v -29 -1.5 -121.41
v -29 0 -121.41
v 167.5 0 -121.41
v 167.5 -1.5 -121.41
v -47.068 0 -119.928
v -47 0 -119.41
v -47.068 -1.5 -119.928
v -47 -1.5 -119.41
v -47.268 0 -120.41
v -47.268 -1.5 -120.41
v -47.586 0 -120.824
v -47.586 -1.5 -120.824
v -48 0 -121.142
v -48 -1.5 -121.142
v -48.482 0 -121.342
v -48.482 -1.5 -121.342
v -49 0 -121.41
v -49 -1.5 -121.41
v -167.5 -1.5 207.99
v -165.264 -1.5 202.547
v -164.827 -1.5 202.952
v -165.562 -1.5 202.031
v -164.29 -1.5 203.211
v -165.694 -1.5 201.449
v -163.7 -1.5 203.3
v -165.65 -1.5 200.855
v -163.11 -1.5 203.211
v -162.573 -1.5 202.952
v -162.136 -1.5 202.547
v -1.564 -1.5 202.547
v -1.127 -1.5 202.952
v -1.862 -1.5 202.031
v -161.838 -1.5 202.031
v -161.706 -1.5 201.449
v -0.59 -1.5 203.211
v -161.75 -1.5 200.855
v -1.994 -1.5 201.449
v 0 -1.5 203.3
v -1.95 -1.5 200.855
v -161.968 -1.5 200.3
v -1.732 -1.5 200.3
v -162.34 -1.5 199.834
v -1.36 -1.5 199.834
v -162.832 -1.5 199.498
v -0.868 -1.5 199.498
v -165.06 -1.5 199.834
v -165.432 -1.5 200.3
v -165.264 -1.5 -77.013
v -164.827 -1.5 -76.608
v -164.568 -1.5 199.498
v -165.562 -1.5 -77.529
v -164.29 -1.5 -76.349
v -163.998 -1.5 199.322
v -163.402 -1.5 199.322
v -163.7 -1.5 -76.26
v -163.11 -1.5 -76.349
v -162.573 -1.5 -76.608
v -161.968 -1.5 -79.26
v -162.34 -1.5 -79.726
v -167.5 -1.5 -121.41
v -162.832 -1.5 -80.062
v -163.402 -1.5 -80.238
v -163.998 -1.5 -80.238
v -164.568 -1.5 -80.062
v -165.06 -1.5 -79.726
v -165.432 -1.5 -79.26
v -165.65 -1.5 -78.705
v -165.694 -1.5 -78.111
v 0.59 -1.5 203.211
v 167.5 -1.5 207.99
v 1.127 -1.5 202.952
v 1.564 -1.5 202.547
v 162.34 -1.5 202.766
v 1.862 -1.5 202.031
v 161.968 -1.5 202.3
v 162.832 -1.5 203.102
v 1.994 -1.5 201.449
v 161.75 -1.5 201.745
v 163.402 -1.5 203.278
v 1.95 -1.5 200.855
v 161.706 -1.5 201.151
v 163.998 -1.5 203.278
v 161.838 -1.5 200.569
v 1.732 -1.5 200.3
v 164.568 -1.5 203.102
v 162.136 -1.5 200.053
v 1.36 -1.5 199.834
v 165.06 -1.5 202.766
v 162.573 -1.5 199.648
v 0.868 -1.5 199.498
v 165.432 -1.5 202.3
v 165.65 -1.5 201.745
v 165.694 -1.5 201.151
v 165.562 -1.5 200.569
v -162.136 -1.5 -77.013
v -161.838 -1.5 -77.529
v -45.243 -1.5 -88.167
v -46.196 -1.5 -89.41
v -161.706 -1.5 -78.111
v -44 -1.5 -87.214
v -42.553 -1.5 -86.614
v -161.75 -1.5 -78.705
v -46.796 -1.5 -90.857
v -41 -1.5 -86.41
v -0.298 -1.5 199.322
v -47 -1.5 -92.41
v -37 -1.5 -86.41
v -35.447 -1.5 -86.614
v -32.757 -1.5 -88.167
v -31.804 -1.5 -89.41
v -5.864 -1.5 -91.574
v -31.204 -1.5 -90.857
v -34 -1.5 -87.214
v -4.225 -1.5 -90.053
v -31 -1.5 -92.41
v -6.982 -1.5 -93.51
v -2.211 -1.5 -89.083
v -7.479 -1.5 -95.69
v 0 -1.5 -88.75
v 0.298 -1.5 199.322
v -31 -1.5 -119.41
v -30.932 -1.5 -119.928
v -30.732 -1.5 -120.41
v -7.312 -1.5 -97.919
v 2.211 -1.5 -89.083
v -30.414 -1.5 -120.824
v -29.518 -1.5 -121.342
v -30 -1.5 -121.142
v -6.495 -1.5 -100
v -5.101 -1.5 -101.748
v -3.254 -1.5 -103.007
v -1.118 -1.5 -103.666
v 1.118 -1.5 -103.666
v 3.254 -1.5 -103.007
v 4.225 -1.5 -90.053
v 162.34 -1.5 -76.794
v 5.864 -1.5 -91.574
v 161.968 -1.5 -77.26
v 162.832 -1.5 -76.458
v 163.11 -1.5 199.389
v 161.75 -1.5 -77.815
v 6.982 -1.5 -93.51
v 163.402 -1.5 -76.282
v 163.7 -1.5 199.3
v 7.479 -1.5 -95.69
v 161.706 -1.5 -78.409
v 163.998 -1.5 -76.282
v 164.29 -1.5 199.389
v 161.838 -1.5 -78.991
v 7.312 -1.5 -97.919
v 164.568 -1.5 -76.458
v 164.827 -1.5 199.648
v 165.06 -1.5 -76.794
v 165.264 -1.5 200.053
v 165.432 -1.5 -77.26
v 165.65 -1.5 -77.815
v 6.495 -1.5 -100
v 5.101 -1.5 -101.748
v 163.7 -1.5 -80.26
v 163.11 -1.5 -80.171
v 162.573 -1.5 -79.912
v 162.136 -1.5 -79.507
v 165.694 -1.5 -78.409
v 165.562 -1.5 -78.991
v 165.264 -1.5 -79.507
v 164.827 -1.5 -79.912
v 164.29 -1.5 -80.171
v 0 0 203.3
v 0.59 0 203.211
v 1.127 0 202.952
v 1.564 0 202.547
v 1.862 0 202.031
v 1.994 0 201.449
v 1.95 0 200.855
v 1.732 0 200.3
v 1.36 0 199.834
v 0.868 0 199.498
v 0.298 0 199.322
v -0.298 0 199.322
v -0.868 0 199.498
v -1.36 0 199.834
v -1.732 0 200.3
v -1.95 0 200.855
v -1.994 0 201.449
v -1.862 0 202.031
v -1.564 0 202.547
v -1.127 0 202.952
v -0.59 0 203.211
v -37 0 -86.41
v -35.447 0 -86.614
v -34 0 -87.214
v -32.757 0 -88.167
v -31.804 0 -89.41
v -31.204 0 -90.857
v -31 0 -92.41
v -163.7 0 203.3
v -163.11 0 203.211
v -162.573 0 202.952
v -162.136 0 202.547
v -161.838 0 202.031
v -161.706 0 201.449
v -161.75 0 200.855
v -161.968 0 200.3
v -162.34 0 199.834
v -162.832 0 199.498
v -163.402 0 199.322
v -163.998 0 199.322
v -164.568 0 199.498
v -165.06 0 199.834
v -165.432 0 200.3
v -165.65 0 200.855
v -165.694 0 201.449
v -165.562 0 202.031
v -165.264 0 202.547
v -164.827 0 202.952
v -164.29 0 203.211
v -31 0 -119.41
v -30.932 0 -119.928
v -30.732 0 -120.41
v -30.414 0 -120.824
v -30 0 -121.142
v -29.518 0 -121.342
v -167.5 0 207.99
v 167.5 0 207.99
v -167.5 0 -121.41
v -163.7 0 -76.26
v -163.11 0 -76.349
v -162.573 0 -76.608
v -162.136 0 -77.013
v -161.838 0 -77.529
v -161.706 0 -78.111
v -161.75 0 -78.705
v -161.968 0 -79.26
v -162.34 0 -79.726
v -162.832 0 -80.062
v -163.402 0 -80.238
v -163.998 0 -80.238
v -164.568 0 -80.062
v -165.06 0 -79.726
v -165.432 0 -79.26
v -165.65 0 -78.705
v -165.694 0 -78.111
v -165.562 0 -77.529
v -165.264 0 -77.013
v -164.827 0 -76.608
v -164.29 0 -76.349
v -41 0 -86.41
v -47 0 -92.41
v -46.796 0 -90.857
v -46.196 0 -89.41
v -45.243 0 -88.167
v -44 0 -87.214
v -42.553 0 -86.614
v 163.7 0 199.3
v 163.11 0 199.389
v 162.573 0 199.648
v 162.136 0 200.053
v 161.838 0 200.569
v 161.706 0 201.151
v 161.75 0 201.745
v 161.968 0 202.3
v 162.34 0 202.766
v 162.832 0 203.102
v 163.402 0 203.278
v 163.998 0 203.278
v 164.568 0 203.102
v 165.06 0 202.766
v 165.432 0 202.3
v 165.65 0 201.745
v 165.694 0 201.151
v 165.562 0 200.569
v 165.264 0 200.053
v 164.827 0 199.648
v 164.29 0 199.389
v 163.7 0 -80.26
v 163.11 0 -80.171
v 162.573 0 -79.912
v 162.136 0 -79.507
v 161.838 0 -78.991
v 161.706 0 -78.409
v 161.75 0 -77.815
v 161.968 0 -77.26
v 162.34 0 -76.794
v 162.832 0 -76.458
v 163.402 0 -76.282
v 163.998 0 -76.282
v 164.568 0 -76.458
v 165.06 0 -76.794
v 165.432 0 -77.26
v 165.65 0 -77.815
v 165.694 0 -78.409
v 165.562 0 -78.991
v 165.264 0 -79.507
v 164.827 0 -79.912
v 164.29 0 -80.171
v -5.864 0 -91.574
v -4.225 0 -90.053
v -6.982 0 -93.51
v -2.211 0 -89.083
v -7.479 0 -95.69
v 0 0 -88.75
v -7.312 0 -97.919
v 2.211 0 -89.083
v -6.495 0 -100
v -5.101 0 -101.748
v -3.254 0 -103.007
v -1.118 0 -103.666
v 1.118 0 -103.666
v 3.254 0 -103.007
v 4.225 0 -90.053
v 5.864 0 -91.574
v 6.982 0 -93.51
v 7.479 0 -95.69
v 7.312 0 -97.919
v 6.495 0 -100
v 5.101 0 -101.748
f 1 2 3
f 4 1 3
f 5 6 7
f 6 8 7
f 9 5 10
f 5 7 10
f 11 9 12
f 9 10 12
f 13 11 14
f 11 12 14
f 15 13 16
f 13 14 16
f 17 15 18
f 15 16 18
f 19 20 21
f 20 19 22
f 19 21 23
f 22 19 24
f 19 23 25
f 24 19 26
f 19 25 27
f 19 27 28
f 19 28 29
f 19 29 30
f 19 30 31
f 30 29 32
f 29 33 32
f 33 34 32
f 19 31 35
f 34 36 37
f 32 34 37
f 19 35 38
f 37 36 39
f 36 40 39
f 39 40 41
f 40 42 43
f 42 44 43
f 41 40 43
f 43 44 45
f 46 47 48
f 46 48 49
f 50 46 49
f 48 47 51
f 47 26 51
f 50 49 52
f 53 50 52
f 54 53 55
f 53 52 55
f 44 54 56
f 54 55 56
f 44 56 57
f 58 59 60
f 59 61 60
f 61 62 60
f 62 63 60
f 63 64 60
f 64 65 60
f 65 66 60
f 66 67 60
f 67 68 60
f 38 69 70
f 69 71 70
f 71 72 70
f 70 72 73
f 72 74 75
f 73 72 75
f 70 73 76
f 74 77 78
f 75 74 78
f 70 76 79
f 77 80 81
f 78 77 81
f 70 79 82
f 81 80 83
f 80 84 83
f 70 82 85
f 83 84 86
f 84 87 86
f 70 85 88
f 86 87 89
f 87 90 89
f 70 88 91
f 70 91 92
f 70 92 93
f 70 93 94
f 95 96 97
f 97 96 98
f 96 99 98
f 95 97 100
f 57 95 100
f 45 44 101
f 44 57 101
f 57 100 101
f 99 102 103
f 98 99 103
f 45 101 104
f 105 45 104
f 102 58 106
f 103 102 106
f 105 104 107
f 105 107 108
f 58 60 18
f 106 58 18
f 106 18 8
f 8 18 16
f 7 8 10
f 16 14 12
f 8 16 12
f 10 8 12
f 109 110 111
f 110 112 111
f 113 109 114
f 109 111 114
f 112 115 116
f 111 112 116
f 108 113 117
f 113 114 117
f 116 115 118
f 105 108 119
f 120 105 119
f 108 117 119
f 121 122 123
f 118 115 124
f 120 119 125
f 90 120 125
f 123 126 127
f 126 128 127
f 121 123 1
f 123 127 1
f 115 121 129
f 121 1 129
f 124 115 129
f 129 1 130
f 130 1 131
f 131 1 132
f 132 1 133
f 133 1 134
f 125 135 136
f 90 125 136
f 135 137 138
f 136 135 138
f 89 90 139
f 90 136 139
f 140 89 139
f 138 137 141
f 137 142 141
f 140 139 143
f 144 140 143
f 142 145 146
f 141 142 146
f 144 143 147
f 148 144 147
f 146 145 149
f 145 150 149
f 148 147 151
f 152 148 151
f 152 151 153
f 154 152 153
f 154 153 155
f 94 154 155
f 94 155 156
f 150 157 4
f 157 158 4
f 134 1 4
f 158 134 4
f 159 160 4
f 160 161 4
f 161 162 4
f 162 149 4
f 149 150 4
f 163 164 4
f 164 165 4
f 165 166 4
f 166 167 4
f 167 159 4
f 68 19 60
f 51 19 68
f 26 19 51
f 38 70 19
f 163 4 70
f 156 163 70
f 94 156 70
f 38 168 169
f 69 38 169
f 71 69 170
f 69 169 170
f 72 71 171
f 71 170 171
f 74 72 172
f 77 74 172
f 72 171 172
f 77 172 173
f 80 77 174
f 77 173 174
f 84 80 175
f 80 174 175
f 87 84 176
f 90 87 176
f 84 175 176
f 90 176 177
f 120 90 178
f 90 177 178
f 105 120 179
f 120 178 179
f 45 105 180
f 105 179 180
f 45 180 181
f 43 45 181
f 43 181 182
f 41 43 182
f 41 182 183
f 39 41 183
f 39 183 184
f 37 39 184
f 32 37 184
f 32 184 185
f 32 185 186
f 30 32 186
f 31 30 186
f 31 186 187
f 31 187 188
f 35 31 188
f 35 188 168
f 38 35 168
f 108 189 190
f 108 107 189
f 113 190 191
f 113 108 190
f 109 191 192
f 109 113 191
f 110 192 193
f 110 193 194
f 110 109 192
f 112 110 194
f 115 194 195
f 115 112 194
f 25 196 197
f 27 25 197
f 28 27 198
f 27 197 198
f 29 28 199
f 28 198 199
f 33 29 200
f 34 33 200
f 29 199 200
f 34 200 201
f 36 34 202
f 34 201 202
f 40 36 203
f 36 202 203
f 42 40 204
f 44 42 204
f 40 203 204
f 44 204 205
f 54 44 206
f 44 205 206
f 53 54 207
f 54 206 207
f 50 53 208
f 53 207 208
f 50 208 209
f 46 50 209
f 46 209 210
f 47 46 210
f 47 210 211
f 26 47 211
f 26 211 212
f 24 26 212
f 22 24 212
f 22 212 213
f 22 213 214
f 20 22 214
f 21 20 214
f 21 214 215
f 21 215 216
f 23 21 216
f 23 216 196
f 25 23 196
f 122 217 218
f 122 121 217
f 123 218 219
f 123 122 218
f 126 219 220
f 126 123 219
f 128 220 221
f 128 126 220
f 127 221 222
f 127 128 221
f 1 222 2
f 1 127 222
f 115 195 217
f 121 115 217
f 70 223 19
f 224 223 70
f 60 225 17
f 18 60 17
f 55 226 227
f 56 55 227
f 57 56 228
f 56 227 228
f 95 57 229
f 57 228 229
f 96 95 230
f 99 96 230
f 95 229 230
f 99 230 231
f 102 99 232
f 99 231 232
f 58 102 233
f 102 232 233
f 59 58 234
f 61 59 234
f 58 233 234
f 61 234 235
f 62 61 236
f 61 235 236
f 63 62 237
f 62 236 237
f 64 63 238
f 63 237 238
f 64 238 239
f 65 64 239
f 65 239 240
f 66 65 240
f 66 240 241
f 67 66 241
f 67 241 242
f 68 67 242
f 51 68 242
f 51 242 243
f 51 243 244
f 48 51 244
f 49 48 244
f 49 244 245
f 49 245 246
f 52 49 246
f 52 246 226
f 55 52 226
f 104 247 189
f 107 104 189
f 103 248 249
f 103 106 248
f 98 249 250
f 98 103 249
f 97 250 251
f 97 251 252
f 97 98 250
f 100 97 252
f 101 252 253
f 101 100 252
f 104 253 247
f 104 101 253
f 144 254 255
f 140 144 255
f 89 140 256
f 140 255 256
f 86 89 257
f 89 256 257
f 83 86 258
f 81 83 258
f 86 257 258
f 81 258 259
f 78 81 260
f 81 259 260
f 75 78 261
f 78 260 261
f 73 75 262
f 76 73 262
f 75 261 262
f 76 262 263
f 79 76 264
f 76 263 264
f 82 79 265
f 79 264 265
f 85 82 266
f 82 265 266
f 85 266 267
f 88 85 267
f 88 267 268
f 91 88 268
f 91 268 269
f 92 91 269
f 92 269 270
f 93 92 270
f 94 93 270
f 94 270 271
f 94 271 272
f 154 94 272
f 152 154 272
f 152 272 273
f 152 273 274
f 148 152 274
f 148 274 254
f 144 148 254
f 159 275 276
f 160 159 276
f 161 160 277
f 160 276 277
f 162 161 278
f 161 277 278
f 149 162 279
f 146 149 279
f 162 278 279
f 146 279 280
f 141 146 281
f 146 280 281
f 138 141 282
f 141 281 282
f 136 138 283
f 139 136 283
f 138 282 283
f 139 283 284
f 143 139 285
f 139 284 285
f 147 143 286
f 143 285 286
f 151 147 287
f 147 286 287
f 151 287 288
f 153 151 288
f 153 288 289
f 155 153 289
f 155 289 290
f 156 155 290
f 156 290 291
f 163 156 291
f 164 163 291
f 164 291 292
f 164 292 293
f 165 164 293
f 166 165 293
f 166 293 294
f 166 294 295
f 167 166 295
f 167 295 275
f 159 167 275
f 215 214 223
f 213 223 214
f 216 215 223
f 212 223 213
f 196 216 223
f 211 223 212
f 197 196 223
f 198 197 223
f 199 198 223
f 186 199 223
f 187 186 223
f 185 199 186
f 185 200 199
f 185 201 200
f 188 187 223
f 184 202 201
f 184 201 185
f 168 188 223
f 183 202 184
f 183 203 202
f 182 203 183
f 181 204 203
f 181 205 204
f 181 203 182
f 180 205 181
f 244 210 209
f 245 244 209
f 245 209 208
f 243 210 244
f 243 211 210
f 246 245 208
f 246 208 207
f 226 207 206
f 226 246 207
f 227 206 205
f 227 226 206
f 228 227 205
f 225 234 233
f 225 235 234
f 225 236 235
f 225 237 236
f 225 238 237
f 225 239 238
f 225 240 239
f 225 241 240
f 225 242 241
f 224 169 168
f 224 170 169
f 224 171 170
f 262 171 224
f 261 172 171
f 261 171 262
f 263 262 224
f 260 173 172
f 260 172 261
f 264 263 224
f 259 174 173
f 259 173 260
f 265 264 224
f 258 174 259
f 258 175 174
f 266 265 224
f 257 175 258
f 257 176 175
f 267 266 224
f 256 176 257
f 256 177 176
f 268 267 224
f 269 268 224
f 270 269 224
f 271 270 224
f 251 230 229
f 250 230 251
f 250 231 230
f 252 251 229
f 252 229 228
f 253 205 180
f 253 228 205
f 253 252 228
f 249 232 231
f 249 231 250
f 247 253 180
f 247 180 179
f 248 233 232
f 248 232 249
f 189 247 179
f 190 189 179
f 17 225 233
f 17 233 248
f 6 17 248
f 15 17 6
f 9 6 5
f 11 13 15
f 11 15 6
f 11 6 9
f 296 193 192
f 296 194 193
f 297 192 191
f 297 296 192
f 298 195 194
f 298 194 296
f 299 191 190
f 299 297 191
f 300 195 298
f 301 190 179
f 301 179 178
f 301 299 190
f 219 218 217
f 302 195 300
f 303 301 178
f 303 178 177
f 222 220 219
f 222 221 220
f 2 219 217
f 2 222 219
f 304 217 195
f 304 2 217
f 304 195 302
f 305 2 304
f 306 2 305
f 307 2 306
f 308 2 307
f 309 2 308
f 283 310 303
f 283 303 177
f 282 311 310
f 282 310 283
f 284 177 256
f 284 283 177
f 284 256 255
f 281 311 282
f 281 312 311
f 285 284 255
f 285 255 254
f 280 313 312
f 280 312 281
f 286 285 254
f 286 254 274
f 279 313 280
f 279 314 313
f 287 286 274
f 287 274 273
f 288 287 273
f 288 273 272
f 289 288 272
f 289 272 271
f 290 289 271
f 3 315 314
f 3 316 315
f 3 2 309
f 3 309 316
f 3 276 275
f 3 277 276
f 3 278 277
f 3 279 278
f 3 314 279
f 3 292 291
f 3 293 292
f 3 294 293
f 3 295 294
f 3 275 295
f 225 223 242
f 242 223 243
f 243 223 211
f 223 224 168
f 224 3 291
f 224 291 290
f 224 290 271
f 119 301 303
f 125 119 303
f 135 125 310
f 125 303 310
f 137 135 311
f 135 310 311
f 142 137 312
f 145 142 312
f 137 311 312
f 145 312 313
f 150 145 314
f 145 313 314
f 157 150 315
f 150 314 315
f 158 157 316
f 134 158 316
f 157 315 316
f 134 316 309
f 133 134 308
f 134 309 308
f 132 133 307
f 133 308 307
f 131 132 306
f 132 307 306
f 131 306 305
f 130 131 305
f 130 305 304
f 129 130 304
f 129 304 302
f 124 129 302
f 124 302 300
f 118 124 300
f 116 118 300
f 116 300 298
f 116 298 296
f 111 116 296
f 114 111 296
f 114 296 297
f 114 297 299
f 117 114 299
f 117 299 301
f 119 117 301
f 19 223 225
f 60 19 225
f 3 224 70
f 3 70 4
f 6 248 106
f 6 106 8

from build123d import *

# Parameters (mm, degrees)
CROQUIS12_W           = 335
CROQUIS12_H           = 329.4
BRIDA_BASE2_DEPTH     = 1.5
CORTAR_EXTRUIR6_REACH = 269.055
CROQUIS27_R           = 2
CORTAR_EXTRUIR7_REACH = 269.055
CROQUIS28_R           = 7.5
CROQUIS29_W           = 16
CROQUIS29_H           = 35
CORTAR_EXTRUIR8_DEPTH = 268.054938355
REDONDEO1_R           = 6
REDONDEO2_R           = 2


# Sheet-metal steps are written as plain solids
with BuildPart() as part:
    # Croquis12 → Brida base2 (new body)
    with BuildSketch(Plane(origin=(0, 0, 0), x_dir=(1, 0, 0), z_dir=(0, 1, 0))):
        with Locations((0, -43.29)):
            Rectangle(CROQUIS12_W, CROQUIS12_H)
    extrude(amount=-BRIDA_BASE2_DEPTH)

    # Croquis27 → Cortar-Extruir6 (cut, up to next)
    with BuildSketch(Plane(origin=(0, 0, 0), x_dir=(1, 0, 0), z_dir=(0, 1, 0)), mode=Mode.PRIVATE) as cortar_extruir6_sk1:
        with Locations(Location((-163.7, -201.3, 0), (0, 0, 270))):
            Circle(CROQUIS27_R)
    cortar_extruir6_tool1 = extrude(cortar_extruir6_sk1.sketch, amount=-CORTAR_EXTRUIR6_REACH, mode=Mode.PRIVATE) & part.part
    # Croquis27 → Cortar-Extruir6 (cut, up to next)
    with BuildSketch(Plane(origin=(0, 0, 0), x_dir=(1, 0, 0), z_dir=(0, 1, 0)), mode=Mode.PRIVATE) as cortar_extruir6_sk2:
        with Locations(Location((-163.7, 78.26, 0), (0, 0, 270))):
            Circle(CROQUIS27_R)
    cortar_extruir6_tool2 = extrude(cortar_extruir6_sk2.sketch, amount=-CORTAR_EXTRUIR6_REACH, mode=Mode.PRIVATE) & part.part
    # Croquis27 → Cortar-Extruir6 (cut, up to next)
    with BuildSketch(Plane(origin=(0, 0, 0), x_dir=(1, 0, 0), z_dir=(0, 1, 0)), mode=Mode.PRIVATE) as cortar_extruir6_sk3:
        with Locations(Location((163.7, 78.26, 0), (0, 0, 90))):
            Circle(CROQUIS27_R)
    cortar_extruir6_tool3 = extrude(cortar_extruir6_sk3.sketch, amount=-CORTAR_EXTRUIR6_REACH, mode=Mode.PRIVATE) & part.part
    # Croquis27 → Cortar-Extruir6 (cut, up to next)
    with BuildSketch(Plane(origin=(0, 0, 0), x_dir=(1, 0, 0), z_dir=(0, 1, 0)), mode=Mode.PRIVATE) as cortar_extruir6_sk4:
        with Locations(Location((163.7, -201.3, 0), (0, 0, 90))):
            Circle(CROQUIS27_R)
    cortar_extruir6_tool4 = extrude(cortar_extruir6_sk4.sketch, amount=-CORTAR_EXTRUIR6_REACH, mode=Mode.PRIVATE) & part.part
    # Croquis27 → Cortar-Extruir6 (cut, up to next)
    with BuildSketch(Plane(origin=(0, 0, 0), x_dir=(1, 0, 0), z_dir=(0, 1, 0)), mode=Mode.PRIVATE) as cortar_extruir6_sk5:
        with Locations(Location((0, -201.3, 0), (0, 0, 270))):
            Circle(CROQUIS27_R)
    cortar_extruir6_tool5 = extrude(cortar_extruir6_sk5.sketch, amount=-CORTAR_EXTRUIR6_REACH, mode=Mode.PRIVATE) & part.part
    add(cortar_extruir6_tool1.solids().sort_by_distance((-163.7, 0, 201.3))[0], mode=Mode.SUBTRACT)
    add(cortar_extruir6_tool2.solids().sort_by_distance((-163.7, 0, -78.26))[0], mode=Mode.SUBTRACT)
    add(cortar_extruir6_tool3.solids().sort_by_distance((163.7, 0, -78.26))[0], mode=Mode.SUBTRACT)
    add(cortar_extruir6_tool4.solids().sort_by_distance((163.7, 0, 201.3))[0], mode=Mode.SUBTRACT)
    add(cortar_extruir6_tool5.solids().sort_by_distance((0, 0, 201.3))[0], mode=Mode.SUBTRACT)

    # Croquis28 → Cortar-Extruir7 (cut, up to next)
    with BuildSketch(Plane(origin=(0, 0, 0), x_dir=(1, 0, 0), z_dir=(0, 1, 0)), mode=Mode.PRIVATE) as cortar_extruir7_sk1:
        with Locations(Location((0, 96.25, 0), (0, 0, 270))):
            Circle(CROQUIS28_R)
    cortar_extruir7_tool1 = extrude(cortar_extruir7_sk1.sketch, amount=-CORTAR_EXTRUIR7_REACH, mode=Mode.PRIVATE) & part.part
    add(cortar_extruir7_tool1.solids().sort_by_distance((0, 0, -96.25))[0], mode=Mode.SUBTRACT)

    # Croquis29 → Cortar-Extruir8 (cut, through all)
    with BuildSketch(Plane(origin=(0, 0, 0), x_dir=(1, 0, 0), z_dir=(0, 1, 0))):
        with Locations((-39, 103.91)):
            Rectangle(CROQUIS29_W, CROQUIS29_H)
    extrude(amount=-CORTAR_EXTRUIR8_DEPTH, mode=Mode.SUBTRACT)

    # Redondeo1
    redondeo1_edges = [part.edges().sort_by_distance(p)[0] for p in [
        (-47, -0.75, -86.41),
        (-31, -0.75, -86.41),
    ]]
    fillet(redondeo1_edges, radius=REDONDEO1_R)

    # Redondeo2
    redondeo2_edges = [part.edges().sort_by_distance(p)[0] for p in [
        (-47, -0.75, -121.41),
        (-31, -0.75, -121.41),
    ]]
    fillet(redondeo2_edges, radius=REDONDEO2_R)


solid = part.part
